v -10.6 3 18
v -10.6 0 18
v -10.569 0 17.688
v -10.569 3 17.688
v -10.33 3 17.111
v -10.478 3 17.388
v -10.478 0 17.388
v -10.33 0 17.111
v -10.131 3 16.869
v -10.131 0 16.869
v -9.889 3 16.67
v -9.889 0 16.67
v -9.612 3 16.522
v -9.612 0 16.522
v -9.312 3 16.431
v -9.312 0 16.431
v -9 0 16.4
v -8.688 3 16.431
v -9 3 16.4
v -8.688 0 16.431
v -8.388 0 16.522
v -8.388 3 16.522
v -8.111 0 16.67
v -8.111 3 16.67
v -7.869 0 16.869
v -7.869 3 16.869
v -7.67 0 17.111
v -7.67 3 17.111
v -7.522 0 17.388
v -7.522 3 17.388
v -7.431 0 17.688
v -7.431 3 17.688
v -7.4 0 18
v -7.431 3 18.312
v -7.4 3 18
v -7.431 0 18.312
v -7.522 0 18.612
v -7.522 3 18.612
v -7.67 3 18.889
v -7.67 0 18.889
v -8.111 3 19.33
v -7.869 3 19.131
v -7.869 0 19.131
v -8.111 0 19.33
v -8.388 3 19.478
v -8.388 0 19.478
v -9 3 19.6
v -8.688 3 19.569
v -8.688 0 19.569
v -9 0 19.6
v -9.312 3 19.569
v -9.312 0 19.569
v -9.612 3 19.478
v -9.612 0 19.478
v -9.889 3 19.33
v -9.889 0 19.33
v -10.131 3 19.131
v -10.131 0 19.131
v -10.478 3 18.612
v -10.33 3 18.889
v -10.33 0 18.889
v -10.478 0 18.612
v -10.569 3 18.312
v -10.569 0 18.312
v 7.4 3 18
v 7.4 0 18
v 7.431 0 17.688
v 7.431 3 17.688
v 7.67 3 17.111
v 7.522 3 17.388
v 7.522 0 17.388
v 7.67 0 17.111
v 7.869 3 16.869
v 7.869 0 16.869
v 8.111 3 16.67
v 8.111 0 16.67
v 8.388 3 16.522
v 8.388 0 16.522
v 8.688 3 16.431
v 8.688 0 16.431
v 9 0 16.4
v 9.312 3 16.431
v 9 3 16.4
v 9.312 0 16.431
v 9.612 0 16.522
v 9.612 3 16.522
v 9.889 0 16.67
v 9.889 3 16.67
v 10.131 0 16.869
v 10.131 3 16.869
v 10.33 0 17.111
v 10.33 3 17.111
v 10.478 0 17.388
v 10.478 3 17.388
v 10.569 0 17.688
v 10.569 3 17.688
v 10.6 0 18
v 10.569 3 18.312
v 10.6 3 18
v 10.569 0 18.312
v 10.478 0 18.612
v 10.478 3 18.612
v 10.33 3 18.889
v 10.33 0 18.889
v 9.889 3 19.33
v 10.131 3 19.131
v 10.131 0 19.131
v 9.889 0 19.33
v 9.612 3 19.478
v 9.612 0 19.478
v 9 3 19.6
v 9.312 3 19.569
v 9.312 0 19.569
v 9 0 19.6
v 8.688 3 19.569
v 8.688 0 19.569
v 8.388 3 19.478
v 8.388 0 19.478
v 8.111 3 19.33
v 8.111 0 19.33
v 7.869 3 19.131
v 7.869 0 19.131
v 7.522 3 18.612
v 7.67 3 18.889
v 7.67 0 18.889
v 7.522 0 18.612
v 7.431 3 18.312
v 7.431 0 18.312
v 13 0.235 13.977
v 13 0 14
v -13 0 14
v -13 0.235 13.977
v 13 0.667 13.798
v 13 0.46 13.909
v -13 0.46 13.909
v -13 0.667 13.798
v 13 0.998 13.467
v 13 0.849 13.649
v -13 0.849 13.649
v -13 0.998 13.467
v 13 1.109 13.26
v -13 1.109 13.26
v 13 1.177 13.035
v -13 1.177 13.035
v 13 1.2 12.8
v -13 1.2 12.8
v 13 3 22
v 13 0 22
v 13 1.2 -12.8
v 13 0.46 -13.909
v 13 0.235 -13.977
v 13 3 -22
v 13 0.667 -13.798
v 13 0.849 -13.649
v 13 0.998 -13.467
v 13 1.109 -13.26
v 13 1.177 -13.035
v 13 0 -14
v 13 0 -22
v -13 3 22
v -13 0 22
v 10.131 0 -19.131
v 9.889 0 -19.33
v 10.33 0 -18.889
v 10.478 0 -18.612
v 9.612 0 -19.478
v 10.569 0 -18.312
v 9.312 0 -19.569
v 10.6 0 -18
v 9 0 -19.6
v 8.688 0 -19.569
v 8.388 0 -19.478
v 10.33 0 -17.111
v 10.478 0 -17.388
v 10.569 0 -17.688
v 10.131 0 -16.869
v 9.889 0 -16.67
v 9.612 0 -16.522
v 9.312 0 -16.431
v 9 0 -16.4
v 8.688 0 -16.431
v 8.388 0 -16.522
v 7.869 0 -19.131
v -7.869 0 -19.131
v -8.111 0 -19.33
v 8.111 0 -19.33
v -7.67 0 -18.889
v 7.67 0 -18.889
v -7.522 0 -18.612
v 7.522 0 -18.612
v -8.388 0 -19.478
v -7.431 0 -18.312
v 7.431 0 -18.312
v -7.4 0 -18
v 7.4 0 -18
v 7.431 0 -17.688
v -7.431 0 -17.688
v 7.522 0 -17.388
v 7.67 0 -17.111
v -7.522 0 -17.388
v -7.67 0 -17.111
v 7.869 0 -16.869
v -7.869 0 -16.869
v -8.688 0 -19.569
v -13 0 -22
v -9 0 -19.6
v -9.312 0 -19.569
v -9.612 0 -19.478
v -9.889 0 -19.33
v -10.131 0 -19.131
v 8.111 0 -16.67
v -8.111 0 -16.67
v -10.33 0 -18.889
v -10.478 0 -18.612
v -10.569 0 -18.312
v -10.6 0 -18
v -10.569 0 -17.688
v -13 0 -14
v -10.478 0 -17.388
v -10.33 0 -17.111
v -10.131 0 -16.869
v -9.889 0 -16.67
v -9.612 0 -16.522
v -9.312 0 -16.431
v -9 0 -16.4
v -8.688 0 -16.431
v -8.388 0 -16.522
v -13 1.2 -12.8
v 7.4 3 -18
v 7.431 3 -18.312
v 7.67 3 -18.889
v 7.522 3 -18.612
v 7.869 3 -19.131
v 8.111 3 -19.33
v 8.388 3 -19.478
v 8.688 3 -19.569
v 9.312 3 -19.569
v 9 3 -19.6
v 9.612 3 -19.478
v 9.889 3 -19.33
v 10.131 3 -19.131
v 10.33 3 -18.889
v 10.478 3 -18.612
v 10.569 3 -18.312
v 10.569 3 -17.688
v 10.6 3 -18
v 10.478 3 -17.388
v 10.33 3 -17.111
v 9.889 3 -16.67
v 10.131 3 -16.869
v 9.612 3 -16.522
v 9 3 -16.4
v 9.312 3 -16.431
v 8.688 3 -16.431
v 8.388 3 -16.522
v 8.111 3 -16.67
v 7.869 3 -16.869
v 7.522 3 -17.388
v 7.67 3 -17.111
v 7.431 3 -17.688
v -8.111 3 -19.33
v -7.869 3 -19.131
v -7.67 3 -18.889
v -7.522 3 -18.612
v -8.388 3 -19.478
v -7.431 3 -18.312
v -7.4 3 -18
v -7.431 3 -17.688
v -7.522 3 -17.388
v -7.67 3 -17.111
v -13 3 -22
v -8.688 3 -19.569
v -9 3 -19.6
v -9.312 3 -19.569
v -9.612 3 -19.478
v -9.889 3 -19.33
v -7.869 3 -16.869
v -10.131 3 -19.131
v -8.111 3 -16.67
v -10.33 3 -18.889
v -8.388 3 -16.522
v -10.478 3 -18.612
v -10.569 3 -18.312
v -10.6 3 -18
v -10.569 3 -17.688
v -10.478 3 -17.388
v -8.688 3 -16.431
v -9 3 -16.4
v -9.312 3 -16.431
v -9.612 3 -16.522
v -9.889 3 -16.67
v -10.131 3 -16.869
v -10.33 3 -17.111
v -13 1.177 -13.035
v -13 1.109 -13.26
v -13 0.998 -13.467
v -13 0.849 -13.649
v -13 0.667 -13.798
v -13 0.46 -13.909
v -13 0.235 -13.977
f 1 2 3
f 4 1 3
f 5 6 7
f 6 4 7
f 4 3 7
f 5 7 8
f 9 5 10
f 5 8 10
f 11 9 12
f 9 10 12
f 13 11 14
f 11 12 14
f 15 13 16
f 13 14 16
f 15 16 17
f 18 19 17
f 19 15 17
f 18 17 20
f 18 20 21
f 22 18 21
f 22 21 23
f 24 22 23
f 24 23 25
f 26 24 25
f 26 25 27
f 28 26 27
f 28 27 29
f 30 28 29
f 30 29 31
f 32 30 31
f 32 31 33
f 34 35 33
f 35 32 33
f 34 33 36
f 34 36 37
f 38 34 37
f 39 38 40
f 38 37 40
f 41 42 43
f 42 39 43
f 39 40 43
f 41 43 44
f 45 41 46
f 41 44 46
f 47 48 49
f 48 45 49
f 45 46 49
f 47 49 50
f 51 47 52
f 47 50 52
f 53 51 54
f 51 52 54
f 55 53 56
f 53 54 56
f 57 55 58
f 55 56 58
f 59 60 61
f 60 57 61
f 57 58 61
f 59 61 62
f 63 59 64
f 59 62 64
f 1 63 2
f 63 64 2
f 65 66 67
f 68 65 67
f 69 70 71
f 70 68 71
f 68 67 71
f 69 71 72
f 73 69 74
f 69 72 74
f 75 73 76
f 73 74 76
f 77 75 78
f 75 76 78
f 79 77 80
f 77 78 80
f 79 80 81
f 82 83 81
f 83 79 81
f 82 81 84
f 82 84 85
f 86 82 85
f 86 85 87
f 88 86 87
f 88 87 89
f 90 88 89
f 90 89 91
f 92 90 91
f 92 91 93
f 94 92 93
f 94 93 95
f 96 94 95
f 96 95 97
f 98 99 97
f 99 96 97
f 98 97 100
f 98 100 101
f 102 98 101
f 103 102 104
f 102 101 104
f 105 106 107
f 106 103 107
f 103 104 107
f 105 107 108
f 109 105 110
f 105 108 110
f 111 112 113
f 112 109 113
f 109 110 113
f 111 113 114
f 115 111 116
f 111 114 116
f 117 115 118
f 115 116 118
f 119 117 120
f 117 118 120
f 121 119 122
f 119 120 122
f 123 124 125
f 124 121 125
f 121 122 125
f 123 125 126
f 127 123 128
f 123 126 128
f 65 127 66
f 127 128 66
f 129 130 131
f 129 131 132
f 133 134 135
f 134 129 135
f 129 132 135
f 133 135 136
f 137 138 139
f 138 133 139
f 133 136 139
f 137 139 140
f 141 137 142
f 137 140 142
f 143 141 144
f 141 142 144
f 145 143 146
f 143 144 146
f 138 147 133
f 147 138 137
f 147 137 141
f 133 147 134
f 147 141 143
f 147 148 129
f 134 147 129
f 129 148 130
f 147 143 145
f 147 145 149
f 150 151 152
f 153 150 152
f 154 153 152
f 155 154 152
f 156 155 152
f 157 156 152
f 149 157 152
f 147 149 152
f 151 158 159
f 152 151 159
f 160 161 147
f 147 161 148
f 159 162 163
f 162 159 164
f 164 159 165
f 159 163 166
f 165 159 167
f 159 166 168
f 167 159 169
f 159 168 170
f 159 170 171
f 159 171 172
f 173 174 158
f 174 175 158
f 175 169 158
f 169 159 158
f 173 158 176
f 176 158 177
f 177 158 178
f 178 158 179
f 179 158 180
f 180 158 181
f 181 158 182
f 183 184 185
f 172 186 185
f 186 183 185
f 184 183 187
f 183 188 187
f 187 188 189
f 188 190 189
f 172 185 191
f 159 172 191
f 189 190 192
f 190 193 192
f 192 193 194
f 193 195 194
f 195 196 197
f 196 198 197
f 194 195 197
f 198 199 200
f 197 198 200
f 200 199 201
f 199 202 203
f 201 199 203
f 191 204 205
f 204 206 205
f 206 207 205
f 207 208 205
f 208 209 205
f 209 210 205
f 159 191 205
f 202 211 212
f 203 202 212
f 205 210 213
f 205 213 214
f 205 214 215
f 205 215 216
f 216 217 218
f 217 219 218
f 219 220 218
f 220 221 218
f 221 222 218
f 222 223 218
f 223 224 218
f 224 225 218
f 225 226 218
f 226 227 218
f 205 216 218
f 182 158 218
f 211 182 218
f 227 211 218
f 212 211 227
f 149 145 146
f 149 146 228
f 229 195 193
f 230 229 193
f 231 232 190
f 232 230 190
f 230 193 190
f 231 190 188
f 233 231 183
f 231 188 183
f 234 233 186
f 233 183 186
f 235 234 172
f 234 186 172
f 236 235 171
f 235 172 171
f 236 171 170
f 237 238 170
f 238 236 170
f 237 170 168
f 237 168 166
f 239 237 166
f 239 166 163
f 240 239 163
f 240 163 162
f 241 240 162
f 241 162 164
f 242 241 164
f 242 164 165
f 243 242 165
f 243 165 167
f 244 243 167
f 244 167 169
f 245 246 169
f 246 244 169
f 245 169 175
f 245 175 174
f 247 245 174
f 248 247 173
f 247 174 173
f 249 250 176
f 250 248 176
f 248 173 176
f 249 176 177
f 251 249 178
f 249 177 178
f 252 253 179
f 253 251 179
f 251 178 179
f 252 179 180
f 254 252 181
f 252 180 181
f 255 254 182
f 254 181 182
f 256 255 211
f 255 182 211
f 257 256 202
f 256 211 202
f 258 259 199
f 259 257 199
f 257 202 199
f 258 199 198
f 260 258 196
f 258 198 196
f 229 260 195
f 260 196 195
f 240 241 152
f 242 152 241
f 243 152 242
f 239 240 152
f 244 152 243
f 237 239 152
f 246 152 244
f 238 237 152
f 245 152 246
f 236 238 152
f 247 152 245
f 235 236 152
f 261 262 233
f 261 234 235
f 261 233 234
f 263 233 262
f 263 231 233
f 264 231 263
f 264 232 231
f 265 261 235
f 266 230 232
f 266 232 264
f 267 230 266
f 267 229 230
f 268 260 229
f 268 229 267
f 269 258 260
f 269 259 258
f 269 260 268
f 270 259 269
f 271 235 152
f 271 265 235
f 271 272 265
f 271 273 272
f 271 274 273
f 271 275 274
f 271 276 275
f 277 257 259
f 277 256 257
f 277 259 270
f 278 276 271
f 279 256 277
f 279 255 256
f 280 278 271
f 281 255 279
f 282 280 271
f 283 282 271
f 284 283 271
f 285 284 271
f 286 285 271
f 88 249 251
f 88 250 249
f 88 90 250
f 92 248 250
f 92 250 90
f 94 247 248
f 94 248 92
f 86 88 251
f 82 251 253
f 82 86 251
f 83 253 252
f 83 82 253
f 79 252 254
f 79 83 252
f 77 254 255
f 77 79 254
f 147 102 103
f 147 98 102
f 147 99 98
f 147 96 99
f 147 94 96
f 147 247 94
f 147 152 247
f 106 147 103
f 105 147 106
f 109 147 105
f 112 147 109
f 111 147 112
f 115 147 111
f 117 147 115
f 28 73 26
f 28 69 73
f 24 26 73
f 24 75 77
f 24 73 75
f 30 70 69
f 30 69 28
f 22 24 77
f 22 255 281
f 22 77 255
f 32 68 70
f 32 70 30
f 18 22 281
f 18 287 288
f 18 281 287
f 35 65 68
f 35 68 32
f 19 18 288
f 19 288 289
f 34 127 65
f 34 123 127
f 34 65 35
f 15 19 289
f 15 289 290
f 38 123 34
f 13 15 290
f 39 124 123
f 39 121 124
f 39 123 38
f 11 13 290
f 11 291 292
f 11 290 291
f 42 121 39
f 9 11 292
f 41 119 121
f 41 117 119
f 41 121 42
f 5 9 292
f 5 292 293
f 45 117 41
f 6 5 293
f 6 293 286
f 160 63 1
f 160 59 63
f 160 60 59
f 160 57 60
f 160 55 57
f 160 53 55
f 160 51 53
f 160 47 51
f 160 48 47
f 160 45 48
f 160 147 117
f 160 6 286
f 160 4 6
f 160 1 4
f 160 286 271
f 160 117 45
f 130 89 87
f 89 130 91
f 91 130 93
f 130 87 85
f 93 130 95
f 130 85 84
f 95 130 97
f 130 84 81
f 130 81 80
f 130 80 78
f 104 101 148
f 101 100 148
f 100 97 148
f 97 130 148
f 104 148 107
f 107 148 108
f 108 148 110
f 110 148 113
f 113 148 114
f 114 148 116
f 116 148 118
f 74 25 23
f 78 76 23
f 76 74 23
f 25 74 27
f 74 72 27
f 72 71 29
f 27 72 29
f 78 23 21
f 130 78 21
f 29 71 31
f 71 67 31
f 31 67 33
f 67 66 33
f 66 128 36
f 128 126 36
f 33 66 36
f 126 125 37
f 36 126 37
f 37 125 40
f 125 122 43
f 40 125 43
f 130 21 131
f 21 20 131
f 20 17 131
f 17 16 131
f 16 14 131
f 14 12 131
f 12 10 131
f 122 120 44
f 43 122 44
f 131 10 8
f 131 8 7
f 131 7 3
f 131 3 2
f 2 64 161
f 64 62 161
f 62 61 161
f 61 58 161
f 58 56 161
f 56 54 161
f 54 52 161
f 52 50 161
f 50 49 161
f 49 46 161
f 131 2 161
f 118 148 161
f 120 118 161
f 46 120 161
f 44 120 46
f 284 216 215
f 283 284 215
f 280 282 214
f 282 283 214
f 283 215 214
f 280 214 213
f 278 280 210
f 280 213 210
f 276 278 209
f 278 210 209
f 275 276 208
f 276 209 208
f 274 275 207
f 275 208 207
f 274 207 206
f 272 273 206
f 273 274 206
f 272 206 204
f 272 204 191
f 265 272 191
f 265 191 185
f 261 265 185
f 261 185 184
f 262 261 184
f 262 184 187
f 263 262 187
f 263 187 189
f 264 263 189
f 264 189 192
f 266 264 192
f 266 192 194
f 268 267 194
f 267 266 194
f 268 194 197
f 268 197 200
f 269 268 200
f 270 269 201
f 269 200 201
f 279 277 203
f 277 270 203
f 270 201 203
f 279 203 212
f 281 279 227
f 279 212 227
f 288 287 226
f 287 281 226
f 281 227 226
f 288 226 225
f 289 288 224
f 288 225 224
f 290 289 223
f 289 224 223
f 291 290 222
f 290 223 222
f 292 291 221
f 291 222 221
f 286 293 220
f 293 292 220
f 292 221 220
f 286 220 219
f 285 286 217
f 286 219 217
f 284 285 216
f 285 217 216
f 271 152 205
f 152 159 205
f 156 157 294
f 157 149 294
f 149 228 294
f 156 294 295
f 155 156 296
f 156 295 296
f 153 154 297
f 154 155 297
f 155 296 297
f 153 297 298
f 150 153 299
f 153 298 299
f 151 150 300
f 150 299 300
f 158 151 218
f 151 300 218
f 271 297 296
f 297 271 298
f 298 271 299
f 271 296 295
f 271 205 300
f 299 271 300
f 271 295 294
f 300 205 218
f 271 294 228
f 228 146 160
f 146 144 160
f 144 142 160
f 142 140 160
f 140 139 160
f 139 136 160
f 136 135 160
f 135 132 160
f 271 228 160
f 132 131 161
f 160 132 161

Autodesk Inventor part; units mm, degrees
ref_plane "YZ Plane" through (0, 0, 0) normal (1, 0, 0) x (0, 1, 0)
ref_plane "XZ Plane" through (0, 0, 0) normal (0, 1, 0) x (-1, 0, 0)
ref_plane "XY Plane" through (0, 0, 0) normal (0, 0, 1) x (1, 0, 0)
sketch "Sketch1" plane through (0, 0, 0) normal (0, 1, 0) x (-1, 0, 0)
  circle A0 centre (9, 18) radius 1.6
  line L0 (0, 26.5631) -> (0, -32.5504)
  line L1 (19.3723, 0) -> (-25.4899, 0)
  circle A1 centre (9, -18) radius 1.6
  circle A2 centre (-9, 18) radius 1.6
  circle A3 centre (-9, -18) radius 1.6
  line L2 (13, 22) -> (-13, 22)
  line L3 (-13, 22) -> (-13, -22)
  line L4 (-13, -22) -> (13, -22)
  line L5 (13, -22) -> (13, 22)
  point P0 (0, 0)
  dimension "d0" = 3.2
  dimension "d3" = 36
  dimension "d6" = 18
  dimension "d9" = 4
  dimension "d10" = 4
extrude "Extrusion1" add sketch "Sketch1" along normal blind 3
sketch "Sketch2" plane through (13, 0, 22) normal (1, 0, 0) x (0, 0, -1)
  line L0 (0, 0) -> (44, 0) projected
  line L1 (44, 0) -> (44, 3) projected
  line L2 (0, 3) -> (44, 3) projected
  line L3 (0, 0) -> (0, 3) projected
  line L4 (0, 0) -> (44, 0) projected
  line L5 (8, 1.2) -> (36, 1.2)
  line L6 (36, 1.2) -> (36, 0)
  line L7 (36, 0) -> (8, 0)
  line L8 (8, 0) -> (8, 1.2)
  point P0 (22, 0)
  dimension "d13" = 1.2
  dimension "w" = 8
  dimension "d15" = 8
extrude "Extrusion2" cut sketch "Sketch2" against normal through all contours L8 L5 L6 L0
fillet "Fillet1" radius 1.2 2 edges at (0, 1.2, -14) (0, 1.2, 14)
equation "\"d15\" = w"
properties part number "piston-mount"
